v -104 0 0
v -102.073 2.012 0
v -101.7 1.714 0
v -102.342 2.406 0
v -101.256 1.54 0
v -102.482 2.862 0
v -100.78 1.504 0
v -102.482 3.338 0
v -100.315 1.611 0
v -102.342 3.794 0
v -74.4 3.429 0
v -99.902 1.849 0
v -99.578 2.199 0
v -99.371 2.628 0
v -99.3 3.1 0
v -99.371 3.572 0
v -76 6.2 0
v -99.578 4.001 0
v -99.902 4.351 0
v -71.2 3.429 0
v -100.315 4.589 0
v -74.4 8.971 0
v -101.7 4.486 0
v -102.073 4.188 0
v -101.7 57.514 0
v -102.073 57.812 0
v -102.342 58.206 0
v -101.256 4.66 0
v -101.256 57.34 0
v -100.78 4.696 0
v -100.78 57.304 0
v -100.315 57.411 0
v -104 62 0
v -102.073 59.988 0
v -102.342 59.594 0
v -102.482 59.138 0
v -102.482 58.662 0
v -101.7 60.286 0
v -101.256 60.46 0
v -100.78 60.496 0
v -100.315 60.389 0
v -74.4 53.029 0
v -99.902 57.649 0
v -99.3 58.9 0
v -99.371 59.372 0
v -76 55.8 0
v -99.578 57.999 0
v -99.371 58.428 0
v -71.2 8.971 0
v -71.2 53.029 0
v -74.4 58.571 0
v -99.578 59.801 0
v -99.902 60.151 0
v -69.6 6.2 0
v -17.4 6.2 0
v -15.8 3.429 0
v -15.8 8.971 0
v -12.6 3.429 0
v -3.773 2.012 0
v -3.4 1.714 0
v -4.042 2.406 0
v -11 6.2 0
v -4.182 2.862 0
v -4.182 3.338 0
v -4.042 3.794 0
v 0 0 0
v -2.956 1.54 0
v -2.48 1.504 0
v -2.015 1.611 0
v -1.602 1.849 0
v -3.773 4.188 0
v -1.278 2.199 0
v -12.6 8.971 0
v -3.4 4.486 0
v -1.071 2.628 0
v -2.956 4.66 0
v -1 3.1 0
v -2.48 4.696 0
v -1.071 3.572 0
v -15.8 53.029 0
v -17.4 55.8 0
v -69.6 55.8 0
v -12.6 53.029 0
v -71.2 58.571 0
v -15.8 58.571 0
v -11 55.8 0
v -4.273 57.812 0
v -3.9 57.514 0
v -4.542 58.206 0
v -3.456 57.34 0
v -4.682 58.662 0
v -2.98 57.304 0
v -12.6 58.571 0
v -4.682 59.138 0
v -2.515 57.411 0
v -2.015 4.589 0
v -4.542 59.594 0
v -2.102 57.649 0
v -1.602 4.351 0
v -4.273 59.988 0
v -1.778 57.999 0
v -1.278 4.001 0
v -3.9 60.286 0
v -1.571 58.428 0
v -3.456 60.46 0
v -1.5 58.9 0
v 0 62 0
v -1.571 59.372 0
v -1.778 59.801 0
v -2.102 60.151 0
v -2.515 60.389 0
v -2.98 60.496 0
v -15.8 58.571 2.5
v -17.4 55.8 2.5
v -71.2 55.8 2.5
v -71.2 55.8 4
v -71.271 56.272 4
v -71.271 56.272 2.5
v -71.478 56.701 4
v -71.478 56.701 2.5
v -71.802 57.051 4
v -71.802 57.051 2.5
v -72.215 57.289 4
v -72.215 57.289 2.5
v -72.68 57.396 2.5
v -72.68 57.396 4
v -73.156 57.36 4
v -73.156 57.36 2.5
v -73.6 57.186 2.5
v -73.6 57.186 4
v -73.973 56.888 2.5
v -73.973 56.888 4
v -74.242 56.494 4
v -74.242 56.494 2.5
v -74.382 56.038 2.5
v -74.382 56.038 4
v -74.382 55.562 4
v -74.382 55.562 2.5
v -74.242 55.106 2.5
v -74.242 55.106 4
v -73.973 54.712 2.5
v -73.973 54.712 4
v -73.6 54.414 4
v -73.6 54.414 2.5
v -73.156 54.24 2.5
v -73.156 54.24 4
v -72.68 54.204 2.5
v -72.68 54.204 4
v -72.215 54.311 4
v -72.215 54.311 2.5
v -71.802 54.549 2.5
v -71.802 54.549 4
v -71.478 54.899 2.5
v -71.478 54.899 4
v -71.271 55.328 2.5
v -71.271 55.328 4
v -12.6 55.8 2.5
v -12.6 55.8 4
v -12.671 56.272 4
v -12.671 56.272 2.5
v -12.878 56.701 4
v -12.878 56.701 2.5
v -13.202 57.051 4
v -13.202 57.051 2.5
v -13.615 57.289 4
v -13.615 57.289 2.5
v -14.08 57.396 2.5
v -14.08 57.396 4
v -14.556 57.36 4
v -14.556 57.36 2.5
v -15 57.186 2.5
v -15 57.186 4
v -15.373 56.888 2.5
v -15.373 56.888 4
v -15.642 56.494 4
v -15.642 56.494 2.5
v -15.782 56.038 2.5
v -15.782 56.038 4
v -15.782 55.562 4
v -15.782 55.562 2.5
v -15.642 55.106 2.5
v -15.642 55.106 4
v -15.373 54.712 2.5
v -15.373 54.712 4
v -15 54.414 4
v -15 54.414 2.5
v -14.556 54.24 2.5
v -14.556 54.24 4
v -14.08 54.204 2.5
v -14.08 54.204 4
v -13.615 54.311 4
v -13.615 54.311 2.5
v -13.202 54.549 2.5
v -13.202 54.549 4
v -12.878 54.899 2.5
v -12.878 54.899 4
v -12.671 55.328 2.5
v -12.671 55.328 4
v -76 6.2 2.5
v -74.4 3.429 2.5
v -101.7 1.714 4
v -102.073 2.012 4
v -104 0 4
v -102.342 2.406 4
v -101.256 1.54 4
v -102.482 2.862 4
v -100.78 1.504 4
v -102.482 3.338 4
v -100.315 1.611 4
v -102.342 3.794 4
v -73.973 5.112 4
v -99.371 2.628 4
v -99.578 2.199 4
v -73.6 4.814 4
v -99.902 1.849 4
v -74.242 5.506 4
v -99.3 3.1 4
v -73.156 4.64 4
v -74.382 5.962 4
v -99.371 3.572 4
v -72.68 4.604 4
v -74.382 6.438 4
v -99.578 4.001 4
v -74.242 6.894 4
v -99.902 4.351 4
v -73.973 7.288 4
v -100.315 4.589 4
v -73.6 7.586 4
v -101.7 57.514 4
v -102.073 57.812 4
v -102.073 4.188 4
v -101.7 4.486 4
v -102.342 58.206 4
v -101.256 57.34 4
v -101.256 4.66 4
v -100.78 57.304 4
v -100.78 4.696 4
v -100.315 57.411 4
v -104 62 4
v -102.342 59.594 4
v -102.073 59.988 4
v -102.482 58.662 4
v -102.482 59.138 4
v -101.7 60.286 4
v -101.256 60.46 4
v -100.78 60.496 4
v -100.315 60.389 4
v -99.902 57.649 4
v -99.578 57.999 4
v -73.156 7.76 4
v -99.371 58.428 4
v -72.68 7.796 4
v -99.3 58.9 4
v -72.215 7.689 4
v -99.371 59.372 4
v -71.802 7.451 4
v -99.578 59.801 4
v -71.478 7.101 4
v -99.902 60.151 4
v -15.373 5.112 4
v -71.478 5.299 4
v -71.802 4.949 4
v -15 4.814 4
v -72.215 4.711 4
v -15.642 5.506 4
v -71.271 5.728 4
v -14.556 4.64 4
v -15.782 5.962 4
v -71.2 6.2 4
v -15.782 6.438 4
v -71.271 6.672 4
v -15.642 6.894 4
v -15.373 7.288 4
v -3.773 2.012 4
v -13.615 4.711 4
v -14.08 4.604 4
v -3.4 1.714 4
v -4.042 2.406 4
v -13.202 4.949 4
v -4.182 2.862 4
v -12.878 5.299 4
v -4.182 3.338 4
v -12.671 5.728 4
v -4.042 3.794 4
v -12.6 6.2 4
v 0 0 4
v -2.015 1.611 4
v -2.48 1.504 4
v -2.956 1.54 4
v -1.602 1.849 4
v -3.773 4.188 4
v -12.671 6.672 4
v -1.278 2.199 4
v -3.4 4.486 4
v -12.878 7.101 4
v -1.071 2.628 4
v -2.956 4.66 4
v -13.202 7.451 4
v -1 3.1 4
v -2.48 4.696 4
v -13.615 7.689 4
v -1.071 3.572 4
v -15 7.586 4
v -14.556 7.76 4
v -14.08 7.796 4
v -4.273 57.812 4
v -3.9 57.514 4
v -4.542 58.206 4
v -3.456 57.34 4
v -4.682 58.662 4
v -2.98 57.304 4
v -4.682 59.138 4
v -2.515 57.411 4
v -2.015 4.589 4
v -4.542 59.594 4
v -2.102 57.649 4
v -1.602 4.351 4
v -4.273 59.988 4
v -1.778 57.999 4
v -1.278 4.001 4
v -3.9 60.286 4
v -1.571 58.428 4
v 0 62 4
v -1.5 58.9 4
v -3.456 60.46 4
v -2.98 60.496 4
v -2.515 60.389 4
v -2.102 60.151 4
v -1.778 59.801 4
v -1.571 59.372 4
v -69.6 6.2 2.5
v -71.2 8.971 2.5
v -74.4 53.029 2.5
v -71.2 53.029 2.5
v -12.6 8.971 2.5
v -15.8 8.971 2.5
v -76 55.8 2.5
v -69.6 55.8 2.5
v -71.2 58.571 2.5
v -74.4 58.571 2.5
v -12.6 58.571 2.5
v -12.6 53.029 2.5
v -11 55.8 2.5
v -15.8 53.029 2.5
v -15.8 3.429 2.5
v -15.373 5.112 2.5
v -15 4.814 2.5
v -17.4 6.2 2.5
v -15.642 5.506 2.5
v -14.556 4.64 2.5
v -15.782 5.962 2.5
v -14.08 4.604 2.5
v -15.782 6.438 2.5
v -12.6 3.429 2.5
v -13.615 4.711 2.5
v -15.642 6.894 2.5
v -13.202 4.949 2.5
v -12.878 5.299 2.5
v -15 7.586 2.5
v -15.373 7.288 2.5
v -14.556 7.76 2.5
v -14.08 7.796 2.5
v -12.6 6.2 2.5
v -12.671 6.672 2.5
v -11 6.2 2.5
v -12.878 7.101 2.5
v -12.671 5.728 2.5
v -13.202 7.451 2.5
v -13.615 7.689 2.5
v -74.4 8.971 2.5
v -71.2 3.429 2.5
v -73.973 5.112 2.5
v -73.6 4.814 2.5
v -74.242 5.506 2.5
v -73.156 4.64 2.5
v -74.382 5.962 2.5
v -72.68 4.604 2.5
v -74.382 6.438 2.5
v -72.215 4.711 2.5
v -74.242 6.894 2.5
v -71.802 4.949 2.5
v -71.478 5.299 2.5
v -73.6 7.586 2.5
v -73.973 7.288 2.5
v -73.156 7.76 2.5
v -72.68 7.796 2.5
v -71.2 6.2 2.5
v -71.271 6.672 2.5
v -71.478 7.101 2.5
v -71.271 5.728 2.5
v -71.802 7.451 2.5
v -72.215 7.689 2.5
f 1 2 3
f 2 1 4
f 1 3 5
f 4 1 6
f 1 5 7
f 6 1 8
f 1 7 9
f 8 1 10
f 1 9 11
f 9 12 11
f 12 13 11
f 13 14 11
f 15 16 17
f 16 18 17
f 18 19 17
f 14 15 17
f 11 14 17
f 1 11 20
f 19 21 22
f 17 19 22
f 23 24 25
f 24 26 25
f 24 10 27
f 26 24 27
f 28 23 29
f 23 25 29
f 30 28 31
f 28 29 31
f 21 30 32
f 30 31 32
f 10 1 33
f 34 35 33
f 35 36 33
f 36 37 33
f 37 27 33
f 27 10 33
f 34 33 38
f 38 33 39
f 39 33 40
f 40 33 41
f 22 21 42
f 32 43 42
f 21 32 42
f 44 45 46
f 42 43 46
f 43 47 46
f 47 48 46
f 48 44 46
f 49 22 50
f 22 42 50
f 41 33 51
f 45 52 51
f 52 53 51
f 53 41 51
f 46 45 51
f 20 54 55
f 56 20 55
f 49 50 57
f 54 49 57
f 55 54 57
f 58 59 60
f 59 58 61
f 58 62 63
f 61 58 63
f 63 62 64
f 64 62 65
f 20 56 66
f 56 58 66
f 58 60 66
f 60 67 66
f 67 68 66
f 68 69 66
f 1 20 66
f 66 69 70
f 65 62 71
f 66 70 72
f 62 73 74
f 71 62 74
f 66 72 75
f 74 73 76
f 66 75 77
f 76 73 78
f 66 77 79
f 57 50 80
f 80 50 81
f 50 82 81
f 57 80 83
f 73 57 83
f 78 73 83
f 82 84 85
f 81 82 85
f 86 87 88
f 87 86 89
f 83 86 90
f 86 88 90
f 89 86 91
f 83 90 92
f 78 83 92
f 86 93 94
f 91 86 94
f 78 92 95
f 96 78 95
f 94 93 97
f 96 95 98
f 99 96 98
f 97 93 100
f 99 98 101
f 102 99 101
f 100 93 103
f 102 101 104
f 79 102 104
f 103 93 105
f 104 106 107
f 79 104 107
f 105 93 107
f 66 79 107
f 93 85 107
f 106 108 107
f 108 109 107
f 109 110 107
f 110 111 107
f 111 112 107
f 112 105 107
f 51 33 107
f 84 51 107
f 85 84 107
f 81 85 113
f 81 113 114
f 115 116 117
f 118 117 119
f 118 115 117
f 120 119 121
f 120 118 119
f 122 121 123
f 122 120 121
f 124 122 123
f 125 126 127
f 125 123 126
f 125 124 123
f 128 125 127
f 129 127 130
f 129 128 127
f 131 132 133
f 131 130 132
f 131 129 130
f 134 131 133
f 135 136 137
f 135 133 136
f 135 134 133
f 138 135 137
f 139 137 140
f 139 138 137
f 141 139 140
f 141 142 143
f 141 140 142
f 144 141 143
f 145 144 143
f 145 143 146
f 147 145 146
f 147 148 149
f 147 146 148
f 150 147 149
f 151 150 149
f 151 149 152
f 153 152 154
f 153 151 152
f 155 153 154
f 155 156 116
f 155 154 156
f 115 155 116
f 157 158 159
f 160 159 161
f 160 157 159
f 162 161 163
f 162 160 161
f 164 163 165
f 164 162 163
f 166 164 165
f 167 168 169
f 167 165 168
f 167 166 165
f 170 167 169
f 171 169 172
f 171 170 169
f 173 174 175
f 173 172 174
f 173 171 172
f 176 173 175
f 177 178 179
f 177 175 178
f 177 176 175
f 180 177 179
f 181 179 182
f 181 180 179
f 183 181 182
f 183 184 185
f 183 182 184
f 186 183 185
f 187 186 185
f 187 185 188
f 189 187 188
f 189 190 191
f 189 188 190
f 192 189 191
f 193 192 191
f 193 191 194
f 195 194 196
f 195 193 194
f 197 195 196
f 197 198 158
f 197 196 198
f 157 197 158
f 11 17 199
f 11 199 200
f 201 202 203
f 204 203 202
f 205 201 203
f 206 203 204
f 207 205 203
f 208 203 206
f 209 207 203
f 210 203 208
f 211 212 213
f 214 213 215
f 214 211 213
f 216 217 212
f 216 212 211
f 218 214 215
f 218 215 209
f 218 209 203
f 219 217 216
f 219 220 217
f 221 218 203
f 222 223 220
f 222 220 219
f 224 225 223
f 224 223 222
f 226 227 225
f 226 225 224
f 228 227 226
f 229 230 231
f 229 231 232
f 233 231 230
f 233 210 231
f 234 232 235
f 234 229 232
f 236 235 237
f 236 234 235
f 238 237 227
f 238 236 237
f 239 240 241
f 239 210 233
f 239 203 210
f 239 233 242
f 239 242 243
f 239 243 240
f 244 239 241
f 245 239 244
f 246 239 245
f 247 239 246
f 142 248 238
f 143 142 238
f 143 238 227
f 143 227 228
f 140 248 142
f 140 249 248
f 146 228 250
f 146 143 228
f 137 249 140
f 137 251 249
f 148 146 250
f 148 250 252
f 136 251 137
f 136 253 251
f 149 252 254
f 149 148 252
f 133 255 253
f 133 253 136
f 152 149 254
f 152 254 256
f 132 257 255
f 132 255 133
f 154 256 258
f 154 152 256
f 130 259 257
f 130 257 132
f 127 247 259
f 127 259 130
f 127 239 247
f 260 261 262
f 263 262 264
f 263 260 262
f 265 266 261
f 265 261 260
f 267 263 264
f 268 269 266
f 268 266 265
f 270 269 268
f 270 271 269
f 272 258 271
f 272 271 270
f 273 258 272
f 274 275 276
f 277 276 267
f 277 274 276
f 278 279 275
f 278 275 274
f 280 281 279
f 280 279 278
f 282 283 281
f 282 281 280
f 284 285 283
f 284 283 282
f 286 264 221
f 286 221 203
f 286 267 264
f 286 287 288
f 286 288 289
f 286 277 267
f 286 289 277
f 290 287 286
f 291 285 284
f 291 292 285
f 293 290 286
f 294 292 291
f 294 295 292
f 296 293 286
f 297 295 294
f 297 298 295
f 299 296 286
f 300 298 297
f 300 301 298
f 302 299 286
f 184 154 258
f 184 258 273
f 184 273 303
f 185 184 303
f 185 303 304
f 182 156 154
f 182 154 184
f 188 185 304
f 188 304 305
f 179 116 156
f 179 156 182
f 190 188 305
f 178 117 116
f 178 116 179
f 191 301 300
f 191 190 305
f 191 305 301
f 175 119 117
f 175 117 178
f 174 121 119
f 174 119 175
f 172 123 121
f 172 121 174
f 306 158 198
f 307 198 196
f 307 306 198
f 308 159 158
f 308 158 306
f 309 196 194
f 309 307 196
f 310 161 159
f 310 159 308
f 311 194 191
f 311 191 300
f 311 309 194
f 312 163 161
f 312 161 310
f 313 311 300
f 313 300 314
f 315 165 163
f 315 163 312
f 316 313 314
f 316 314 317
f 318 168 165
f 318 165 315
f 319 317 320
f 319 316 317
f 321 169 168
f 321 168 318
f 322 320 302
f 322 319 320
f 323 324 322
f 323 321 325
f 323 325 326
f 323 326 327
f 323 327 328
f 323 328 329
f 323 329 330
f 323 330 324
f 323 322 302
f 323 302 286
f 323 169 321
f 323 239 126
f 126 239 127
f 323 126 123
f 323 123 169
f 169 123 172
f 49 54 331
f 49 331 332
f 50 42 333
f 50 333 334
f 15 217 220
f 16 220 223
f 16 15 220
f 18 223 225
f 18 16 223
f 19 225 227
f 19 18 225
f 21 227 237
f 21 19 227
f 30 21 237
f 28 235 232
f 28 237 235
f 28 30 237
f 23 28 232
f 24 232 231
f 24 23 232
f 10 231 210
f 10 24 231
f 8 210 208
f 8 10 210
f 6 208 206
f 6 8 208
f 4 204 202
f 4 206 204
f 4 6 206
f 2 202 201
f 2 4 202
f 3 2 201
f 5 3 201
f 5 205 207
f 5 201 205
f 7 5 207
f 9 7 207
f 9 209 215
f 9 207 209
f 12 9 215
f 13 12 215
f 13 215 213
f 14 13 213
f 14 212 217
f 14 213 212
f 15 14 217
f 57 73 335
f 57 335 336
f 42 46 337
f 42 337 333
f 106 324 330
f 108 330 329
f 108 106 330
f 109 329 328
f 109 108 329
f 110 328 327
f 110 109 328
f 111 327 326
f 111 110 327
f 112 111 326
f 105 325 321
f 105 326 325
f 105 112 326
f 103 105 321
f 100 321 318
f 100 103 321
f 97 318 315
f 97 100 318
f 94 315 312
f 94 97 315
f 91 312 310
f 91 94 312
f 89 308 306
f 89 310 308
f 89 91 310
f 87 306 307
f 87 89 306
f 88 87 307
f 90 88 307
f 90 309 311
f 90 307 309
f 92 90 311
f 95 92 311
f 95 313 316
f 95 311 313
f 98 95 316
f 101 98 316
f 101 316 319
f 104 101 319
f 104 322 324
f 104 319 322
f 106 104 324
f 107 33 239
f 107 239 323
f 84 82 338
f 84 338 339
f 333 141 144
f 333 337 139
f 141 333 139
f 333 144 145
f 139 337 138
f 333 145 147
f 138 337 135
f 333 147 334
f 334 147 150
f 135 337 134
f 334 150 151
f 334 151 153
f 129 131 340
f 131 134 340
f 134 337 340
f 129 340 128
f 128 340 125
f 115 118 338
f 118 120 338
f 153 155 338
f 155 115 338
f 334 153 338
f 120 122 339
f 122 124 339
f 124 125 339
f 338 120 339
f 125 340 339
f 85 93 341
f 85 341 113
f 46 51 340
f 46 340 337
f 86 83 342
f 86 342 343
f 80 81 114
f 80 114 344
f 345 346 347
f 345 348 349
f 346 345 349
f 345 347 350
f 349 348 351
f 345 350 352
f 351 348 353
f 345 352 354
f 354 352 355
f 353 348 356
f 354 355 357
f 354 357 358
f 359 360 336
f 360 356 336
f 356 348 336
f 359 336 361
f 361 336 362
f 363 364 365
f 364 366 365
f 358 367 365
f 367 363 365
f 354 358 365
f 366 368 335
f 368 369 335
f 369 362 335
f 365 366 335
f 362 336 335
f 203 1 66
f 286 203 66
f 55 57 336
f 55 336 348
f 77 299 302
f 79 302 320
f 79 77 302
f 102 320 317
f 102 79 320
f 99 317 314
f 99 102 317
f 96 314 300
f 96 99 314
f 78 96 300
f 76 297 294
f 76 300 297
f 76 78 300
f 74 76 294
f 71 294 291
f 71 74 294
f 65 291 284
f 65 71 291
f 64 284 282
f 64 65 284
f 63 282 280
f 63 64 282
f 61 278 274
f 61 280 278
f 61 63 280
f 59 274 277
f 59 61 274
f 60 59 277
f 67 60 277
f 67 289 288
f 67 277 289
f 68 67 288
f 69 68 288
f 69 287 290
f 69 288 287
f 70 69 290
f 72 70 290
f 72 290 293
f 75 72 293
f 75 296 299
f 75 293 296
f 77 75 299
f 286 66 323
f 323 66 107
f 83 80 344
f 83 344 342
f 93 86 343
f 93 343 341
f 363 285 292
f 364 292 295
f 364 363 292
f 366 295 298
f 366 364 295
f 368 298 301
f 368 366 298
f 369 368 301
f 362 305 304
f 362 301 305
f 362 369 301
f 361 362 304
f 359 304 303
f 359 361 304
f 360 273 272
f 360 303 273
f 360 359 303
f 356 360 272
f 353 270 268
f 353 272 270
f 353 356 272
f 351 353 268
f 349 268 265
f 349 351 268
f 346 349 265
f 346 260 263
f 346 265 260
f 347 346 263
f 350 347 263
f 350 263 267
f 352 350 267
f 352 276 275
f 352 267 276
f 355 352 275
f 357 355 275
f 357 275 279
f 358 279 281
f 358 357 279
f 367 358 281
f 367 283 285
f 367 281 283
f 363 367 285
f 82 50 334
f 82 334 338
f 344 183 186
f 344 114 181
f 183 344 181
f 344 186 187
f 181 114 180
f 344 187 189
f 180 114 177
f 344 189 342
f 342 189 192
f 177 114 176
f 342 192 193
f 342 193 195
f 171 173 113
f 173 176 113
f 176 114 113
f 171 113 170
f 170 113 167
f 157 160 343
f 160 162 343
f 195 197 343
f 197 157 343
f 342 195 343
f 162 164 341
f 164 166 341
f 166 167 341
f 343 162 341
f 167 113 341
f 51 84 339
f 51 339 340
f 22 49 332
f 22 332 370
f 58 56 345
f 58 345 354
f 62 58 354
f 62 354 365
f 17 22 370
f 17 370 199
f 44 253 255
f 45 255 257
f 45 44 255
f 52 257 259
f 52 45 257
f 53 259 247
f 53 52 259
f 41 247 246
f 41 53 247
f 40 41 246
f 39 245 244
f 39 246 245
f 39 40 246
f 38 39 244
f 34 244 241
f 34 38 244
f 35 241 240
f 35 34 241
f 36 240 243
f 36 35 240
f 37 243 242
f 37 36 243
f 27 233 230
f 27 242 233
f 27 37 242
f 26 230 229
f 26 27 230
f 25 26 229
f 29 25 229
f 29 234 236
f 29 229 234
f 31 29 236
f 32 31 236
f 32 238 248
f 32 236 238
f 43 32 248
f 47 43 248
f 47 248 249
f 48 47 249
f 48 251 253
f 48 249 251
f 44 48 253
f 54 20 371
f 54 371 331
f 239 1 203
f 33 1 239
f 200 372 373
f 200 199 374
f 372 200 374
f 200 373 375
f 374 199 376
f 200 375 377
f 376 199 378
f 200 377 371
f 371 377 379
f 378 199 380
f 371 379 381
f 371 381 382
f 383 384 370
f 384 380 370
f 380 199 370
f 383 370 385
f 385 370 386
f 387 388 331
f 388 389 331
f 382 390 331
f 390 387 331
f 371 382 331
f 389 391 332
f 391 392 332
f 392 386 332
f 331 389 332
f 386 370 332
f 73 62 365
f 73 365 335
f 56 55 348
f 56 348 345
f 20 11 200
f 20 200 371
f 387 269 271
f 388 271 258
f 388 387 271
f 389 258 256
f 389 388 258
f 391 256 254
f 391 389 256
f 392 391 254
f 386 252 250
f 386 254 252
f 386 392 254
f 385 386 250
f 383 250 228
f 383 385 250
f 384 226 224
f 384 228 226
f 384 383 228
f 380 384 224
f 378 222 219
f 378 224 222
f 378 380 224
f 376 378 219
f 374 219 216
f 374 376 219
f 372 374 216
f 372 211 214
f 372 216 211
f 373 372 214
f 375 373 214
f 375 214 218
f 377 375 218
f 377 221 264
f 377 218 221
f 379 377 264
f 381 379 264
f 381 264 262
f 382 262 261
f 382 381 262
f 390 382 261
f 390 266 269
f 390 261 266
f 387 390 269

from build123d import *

# Parameters (mm, degrees)
SKETCH002_R       = 1.6
EXTRUDE002_DEPTH  = 2.5
SKETCH003_R       = 1.6
EXTRUDE003_DEPTH  = 2.5
SKETCH004_R       = 1.6
EXTRUDE004_DEPTH  = 2.5
SKETCH001_R       = 1.6
EXTRUDE001_DEPTH  = 2.5
SKETCH_R          = 1.6
EXTRUDE_DEPTH     = 10
CYLINDER007_R     = 1.6
CYLINDER007_DEPTH = 10
CYLINDER006_R     = 1.6
CYLINDER006_DEPTH = 10
CYLINDER005_R     = 1.6
CYLINDER005_DEPTH = 10
CYLINDER004_R     = 1.6
CYLINDER004_DEPTH = 10
BOX001_W          = 104
BOX001_H          = 62
BOX001_DEPTH      = 4


with BuildPart() as nylon_nut_cutout001:
    # Sketch002 → Extrude002 (new body)
    with BuildSketch(Plane.XY):
        Polygon((3.2, 0), (1.6, 2.771281), (-1.6, 2.771281), (-3.2, 0), (-1.6, -2.771281), (1.6, -2.771281), align=None)
        Circle(SKETCH002_R, mode=Mode.SUBTRACT)
    extrude(amount=EXTRUDE002_DEPTH)


with BuildPart() as nylon_nut_cutout001_1:
    # Extrude002 placement: moved
    add(nylon_nut_cutout001.part.moved(Location((-72.8, 6.2, 0))))


with BuildPart() as nylon_nut_cutout002:
    # Sketch003 → Extrude003 (new body)
    with BuildSketch(Plane.XY):
        Polygon((3.2, 0), (1.6, 2.771281), (-1.6, 2.771281), (-3.2, 0), (-1.6, -2.771281), (1.6, -2.771281), align=None)
        Circle(SKETCH003_R, mode=Mode.SUBTRACT)
    extrude(amount=EXTRUDE003_DEPTH)


with BuildPart() as nylon_nut_cutout002_1:
    # Extrude003 placement: moved
    add(nylon_nut_cutout002.part.moved(Location((-72.8, 55.8, 0))))


with BuildPart() as nylon_nut_cutout003:
    # Sketch004 → Extrude004 (new body)
    with BuildSketch(Plane.XY):
        Polygon((3.2, 0), (1.6, 2.771281), (-1.6, 2.771281), (-3.2, 0), (-1.6, -2.771281), (1.6, -2.771281), align=None)
        Circle(SKETCH004_R, mode=Mode.SUBTRACT)
    extrude(amount=EXTRUDE004_DEPTH)


with BuildPart() as nylon_nut_cutout003_1:
    # Extrude004 placement: moved
    add(nylon_nut_cutout003.part.moved(Location((-14.2, 55.8, 0))))


with BuildPart() as nylon_nut_cutout:
    # Sketch001 → Extrude001 (new body)
    with BuildSketch(Plane.XY):
        Polygon((3.2, 0), (1.6, 2.771281), (-1.6, 2.771281), (-3.2, 0), (-1.6, -2.771281), (1.6, -2.771281), align=None)
        Circle(SKETCH001_R, mode=Mode.SUBTRACT)
    extrude(amount=EXTRUDE001_DEPTH)


with BuildPart() as nylon_nut_cutout_1:
    # Extrude001 placement: moved
    add(nylon_nut_cutout.part.moved(Location((-14.2, 6.2, 0))))


with BuildPart() as extrude_body:
    # Sketch → Extrude (new body)
    with BuildSketch(Plane.XY):
        with Locations((-72.8, 55.8)):
            Circle(SKETCH_R)
        with Locations((-14.2, 55.8)):
            Circle(SKETCH_R)
        with Locations((-14.2, 6.2)):
            Circle(SKETCH_R)
        with Locations((-72.8, 6.2)):
            Circle(SKETCH_R)
    extrude(amount=EXTRUDE_DEPTH)


with BuildPart() as mount_point003:
    # Cylinder007 → Cylinder007 (new body)
    with BuildSketch(Plane(origin=(-3.1, 58.9, 0), x_dir=(1, 0, 0), z_dir=(0, 0, 1))):
        Circle(CYLINDER007_R)
    extrude(amount=CYLINDER007_DEPTH)


with BuildPart() as mount_point002:
    # Cylinder006 → Cylinder006 (new body)
    with BuildSketch(Plane(origin=(-100.9, 58.9, 0), x_dir=(1, 0, 0), z_dir=(0, 0, 1))):
        Circle(CYLINDER006_R)
    extrude(amount=CYLINDER006_DEPTH)


with BuildPart() as mount_point001:
    # Cylinder005 → Cylinder005 (new body)
    with BuildSketch(Plane(origin=(-100.9, 3.1, 0), x_dir=(1, 0, 0), z_dir=(0, 0, 1))):
        Circle(CYLINDER005_R)
    extrude(amount=CYLINDER005_DEPTH)


with BuildPart() as mount_point:
    # Cylinder004 → Cylinder004 (new body)
    with BuildSketch(Plane(origin=(-2.6, 3.1, 0), x_dir=(1, 0, 0), z_dir=(0, 0, 1))):
        Circle(CYLINDER004_R)
    extrude(amount=CYLINDER004_DEPTH)


with BuildPart() as raspberrypi_platform:
    # Box001 → Box001 (new body)
    with BuildSketch(Plane(origin=(-104, 0, 0), x_dir=(1, 0, 0), z_dir=(0, 0, 1))):
        with Locations((52, 31)):
            Rectangle(BOX001_W, BOX001_H)
    extrude(amount=BOX001_DEPTH)

    # Cut005: cut Mount Point
    add(mount_point.part, mode=Mode.SUBTRACT)

    # Cut006: cut Mount Point001
    add(mount_point001.part, mode=Mode.SUBTRACT)

    # Cut007: cut Mount Point002
    add(mount_point002.part, mode=Mode.SUBTRACT)

    # Cut008: cut Mount Point003
    add(mount_point003.part, mode=Mode.SUBTRACT)

    # Cut: cut Extrude body
    add(extrude_body.part, mode=Mode.SUBTRACT)

    # Cut009: cut Nylon Nut Cutout
    add(nylon_nut_cutout_1.part, mode=Mode.SUBTRACT)

    # Cut010: cut Nylon Nut Cutout003
    add(nylon_nut_cutout003_1.part, mode=Mode.SUBTRACT)

    # Cut011: cut Nylon Nut Cutout002
    add(nylon_nut_cutout002_1.part, mode=Mode.SUBTRACT)

    # Cut012: cut Nylon Nut Cutout001
    add(nylon_nut_cutout001_1.part, mode=Mode.SUBTRACT)


solid = raspberrypi_platform.part
